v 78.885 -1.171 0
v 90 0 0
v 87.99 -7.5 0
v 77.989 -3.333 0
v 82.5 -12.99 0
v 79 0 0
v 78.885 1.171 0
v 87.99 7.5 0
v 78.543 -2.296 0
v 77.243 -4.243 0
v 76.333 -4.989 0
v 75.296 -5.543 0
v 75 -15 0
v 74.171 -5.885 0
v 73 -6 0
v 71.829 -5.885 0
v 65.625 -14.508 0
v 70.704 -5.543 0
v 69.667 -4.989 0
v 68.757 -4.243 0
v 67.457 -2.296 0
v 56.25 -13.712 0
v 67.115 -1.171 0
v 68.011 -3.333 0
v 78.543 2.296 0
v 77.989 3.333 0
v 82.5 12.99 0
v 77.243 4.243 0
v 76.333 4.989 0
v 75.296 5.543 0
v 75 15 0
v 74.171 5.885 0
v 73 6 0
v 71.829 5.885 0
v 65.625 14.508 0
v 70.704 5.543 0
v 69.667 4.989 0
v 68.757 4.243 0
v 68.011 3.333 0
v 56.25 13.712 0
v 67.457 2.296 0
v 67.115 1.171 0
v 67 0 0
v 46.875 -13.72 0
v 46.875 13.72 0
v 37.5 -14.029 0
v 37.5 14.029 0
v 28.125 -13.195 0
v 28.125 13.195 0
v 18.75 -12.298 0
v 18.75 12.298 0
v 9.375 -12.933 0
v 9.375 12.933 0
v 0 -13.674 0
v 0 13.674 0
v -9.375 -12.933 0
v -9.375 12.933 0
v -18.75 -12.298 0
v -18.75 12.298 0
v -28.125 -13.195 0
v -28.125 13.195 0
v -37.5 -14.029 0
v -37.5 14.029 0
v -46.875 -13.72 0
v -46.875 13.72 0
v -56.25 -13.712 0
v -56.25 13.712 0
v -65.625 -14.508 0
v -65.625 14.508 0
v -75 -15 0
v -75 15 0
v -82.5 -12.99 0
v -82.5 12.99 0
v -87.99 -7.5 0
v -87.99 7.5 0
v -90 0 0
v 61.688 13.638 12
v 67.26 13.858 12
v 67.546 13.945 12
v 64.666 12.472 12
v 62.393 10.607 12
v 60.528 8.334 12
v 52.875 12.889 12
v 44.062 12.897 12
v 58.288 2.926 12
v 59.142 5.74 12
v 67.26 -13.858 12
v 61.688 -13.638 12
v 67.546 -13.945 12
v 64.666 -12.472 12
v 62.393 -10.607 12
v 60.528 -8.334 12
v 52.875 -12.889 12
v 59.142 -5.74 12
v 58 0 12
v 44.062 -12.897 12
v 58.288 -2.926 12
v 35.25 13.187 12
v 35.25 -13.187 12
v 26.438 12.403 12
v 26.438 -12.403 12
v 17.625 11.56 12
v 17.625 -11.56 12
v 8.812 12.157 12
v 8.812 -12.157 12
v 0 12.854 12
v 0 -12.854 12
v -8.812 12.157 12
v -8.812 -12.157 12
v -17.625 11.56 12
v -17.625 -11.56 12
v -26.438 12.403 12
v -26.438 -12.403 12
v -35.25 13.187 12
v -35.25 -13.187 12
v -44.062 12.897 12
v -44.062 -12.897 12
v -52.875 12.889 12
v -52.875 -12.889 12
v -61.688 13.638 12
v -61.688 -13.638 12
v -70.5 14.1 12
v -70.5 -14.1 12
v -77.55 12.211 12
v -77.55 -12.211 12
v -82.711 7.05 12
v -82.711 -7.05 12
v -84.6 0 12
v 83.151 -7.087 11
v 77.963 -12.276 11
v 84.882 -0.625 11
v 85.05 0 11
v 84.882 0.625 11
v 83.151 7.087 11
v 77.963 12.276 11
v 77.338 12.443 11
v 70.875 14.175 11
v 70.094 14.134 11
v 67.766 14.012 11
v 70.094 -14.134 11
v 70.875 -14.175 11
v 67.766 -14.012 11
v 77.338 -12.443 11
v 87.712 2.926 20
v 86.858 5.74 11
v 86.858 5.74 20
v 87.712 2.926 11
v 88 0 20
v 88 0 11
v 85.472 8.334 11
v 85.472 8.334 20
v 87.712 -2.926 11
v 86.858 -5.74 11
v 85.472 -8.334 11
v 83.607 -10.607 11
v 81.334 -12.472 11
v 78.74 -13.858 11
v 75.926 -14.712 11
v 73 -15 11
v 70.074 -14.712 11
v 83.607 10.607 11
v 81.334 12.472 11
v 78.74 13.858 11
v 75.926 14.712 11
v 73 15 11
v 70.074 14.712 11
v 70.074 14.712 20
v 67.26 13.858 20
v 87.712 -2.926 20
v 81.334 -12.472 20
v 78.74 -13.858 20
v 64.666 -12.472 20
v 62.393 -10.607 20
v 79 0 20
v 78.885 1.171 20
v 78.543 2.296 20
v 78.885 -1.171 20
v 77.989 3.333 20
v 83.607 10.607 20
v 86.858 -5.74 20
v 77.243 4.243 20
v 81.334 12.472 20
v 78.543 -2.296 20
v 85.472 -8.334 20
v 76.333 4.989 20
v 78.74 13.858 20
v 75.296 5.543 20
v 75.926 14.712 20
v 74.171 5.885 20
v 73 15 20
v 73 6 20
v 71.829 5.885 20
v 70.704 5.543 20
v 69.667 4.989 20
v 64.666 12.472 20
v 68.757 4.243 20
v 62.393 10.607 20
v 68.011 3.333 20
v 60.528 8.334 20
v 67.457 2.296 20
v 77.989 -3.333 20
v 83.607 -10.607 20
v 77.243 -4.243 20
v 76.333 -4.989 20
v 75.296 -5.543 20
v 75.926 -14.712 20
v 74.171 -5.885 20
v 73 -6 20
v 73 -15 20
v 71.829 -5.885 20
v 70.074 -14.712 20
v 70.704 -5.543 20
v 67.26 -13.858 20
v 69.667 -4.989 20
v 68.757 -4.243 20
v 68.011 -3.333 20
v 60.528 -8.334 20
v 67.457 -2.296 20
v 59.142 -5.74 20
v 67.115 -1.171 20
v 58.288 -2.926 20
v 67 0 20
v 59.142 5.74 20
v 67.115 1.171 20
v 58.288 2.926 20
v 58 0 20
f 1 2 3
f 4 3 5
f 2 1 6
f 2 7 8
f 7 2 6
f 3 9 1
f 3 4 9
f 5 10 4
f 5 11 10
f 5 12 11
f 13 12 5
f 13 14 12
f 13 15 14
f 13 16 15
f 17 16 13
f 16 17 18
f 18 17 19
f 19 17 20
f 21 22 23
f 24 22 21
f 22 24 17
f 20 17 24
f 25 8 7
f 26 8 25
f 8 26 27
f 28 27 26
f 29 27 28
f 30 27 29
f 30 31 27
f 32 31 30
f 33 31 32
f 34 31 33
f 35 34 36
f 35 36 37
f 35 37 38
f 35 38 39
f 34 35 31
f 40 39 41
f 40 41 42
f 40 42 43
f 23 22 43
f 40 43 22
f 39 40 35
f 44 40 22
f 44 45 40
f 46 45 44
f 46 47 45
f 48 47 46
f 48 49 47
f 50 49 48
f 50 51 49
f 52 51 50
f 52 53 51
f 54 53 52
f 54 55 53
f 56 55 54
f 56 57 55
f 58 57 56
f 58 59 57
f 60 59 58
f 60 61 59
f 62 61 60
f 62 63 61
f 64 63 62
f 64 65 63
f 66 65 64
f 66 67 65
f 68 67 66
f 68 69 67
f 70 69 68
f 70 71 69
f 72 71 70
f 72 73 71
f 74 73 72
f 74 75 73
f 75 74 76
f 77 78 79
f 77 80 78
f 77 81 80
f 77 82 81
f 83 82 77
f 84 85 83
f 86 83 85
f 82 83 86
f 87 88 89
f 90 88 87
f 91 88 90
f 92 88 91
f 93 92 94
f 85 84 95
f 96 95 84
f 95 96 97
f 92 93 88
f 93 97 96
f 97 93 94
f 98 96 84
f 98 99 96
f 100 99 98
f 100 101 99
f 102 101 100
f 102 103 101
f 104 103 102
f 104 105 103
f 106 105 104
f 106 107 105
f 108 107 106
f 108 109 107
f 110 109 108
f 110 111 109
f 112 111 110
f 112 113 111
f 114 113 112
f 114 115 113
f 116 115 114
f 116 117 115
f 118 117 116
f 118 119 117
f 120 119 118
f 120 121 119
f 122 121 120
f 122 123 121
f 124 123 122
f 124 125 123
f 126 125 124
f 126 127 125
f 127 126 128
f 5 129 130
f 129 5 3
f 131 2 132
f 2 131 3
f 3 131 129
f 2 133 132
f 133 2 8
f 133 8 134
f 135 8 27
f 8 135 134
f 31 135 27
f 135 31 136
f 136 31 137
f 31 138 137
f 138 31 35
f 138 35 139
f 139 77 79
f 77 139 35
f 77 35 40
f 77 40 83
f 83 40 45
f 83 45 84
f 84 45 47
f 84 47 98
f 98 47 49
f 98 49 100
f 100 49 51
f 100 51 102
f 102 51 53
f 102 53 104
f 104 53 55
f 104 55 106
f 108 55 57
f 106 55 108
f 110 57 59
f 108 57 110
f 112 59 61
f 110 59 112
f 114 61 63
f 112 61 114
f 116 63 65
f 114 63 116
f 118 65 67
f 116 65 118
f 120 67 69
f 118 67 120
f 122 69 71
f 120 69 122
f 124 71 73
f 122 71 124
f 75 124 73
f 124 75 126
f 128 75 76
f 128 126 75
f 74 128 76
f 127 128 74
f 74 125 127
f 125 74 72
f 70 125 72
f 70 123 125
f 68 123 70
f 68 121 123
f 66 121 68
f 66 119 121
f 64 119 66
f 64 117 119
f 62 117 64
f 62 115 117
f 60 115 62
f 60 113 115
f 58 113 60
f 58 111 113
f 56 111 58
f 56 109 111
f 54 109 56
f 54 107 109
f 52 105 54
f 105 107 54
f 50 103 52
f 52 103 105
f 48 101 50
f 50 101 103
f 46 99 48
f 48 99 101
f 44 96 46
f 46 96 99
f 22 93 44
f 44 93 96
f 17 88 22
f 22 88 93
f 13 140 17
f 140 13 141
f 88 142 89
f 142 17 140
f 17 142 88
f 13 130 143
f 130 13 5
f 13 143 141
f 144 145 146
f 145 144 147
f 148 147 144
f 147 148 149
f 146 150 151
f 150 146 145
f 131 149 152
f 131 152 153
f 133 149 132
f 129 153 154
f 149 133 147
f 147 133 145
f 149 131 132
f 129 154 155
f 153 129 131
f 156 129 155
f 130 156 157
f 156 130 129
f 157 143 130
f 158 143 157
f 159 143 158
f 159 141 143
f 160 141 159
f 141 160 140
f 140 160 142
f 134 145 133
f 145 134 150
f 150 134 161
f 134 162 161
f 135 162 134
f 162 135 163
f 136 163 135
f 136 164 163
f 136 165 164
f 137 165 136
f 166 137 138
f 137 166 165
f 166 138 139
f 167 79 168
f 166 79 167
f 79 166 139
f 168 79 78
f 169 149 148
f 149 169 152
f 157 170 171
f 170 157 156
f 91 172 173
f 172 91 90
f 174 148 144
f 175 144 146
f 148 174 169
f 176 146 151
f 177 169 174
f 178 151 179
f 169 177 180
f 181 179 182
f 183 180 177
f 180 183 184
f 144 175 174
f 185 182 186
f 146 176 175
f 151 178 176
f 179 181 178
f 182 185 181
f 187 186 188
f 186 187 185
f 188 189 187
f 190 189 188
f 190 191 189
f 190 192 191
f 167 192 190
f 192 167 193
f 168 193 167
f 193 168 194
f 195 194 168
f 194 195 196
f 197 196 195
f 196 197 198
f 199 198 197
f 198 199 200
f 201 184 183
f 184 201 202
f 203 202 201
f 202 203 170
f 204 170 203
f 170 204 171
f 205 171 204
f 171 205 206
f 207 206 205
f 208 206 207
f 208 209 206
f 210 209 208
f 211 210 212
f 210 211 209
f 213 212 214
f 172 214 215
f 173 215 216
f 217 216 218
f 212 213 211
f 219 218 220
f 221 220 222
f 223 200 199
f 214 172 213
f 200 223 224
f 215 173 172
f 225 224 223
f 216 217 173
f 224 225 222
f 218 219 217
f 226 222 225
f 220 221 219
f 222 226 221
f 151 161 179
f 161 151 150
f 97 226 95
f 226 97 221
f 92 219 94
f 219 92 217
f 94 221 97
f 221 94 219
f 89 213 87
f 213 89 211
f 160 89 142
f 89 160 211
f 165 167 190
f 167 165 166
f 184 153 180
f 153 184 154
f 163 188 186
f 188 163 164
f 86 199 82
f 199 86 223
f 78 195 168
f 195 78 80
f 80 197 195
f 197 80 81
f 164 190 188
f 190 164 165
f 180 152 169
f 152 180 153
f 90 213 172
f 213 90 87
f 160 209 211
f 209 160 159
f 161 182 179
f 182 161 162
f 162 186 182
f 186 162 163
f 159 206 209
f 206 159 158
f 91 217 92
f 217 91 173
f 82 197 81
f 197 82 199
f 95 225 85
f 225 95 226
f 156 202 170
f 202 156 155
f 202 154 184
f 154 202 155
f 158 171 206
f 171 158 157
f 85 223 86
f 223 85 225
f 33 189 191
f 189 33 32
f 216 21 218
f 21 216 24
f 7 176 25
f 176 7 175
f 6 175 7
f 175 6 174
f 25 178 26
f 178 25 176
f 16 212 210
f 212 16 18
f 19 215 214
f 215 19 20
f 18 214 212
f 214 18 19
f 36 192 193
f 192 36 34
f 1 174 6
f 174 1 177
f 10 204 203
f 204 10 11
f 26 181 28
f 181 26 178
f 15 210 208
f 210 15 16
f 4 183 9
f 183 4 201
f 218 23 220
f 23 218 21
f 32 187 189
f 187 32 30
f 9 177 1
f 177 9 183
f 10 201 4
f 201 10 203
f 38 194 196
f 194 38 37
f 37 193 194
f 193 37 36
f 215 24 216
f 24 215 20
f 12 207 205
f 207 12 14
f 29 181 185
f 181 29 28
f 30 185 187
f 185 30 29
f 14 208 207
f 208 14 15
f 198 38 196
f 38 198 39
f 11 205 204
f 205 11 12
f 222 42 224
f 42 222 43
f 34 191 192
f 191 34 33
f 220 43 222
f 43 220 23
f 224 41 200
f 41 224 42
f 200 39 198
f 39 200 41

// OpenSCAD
$fn = 32;
// ----------------------------------------------------------------------
// Handle: 180 x 30 mm grip, 12 mm thick
// ----------------------------------------------------------------------

// --- parameters (mm) ---
length = 180;             // grip length
width = 30;               // grip width
thickness = 12;           // grip thickness
waist = 0.86;             // width factor at the middle
draft = 0.94;             // top face scale of the extrusion
scallops = 4;             // finger rests per side
ripple = 0.06;            // depth factor of the finger rests
boss_d = 30;              // mounting boss diameter
boss_h = 8;               // mounting boss height
boss_hole_d = 12;         // screw clearance through the boss
boss_r = 73;              // boss centre from the grip centre

/* ergonomic grip outline, closed spline-like polygon in the XY plane */
grip = [[-75, 15], [-65.625, 14.508], [-56.25, 13.712], [-46.875, 13.72], [-37.5, 14.029], [-28.125, 13.195], [-18.75, 12.298], [-9.375, 12.933], [0, 13.674], [9.375, 12.933], [18.75, 12.298], [28.125, 13.195], [37.5, 14.029], [46.875, 13.72], [56.25, 13.712], [65.625, 14.508], [75, 15], [82.5, 12.99], [87.99, 7.5], [90, 0], [87.99, -7.5], [82.5, -12.99], [75, -15], [75, -15], [65.625, -14.508], [56.25, -13.712], [46.875, -13.72], [37.5, -14.029], [28.125, -13.195], [18.75, -12.298], [9.375, -12.933], [0, -13.674], [-9.375, -12.933], [-18.75, -12.298], [-28.125, -13.195], [-37.5, -14.029], [-46.875, -13.72], [-56.25, -13.712], [-65.625, -14.508], [-75, -15], [-82.5, -12.99], [-87.99, -7.5], [-90, 0], [-87.99, 7.5], [-82.5, 12.99], [-75, 15]];

module grip_body() {
  linear_extrude(height = thickness, scale = draft) polygon(grip);
}

module boss_body() {
  /* sunk 1 mm into the grip so the joint overlaps */
  translate([boss_r, 0, thickness - 1]) cylinder(h = boss_h + 1, d = boss_d);
}

difference() {
  union() {
    grip_body();
    boss_body();
  }
  translate([boss_r, 0, -1]) cylinder(h = thickness + boss_h + 2, d = boss_hole_d);
}
